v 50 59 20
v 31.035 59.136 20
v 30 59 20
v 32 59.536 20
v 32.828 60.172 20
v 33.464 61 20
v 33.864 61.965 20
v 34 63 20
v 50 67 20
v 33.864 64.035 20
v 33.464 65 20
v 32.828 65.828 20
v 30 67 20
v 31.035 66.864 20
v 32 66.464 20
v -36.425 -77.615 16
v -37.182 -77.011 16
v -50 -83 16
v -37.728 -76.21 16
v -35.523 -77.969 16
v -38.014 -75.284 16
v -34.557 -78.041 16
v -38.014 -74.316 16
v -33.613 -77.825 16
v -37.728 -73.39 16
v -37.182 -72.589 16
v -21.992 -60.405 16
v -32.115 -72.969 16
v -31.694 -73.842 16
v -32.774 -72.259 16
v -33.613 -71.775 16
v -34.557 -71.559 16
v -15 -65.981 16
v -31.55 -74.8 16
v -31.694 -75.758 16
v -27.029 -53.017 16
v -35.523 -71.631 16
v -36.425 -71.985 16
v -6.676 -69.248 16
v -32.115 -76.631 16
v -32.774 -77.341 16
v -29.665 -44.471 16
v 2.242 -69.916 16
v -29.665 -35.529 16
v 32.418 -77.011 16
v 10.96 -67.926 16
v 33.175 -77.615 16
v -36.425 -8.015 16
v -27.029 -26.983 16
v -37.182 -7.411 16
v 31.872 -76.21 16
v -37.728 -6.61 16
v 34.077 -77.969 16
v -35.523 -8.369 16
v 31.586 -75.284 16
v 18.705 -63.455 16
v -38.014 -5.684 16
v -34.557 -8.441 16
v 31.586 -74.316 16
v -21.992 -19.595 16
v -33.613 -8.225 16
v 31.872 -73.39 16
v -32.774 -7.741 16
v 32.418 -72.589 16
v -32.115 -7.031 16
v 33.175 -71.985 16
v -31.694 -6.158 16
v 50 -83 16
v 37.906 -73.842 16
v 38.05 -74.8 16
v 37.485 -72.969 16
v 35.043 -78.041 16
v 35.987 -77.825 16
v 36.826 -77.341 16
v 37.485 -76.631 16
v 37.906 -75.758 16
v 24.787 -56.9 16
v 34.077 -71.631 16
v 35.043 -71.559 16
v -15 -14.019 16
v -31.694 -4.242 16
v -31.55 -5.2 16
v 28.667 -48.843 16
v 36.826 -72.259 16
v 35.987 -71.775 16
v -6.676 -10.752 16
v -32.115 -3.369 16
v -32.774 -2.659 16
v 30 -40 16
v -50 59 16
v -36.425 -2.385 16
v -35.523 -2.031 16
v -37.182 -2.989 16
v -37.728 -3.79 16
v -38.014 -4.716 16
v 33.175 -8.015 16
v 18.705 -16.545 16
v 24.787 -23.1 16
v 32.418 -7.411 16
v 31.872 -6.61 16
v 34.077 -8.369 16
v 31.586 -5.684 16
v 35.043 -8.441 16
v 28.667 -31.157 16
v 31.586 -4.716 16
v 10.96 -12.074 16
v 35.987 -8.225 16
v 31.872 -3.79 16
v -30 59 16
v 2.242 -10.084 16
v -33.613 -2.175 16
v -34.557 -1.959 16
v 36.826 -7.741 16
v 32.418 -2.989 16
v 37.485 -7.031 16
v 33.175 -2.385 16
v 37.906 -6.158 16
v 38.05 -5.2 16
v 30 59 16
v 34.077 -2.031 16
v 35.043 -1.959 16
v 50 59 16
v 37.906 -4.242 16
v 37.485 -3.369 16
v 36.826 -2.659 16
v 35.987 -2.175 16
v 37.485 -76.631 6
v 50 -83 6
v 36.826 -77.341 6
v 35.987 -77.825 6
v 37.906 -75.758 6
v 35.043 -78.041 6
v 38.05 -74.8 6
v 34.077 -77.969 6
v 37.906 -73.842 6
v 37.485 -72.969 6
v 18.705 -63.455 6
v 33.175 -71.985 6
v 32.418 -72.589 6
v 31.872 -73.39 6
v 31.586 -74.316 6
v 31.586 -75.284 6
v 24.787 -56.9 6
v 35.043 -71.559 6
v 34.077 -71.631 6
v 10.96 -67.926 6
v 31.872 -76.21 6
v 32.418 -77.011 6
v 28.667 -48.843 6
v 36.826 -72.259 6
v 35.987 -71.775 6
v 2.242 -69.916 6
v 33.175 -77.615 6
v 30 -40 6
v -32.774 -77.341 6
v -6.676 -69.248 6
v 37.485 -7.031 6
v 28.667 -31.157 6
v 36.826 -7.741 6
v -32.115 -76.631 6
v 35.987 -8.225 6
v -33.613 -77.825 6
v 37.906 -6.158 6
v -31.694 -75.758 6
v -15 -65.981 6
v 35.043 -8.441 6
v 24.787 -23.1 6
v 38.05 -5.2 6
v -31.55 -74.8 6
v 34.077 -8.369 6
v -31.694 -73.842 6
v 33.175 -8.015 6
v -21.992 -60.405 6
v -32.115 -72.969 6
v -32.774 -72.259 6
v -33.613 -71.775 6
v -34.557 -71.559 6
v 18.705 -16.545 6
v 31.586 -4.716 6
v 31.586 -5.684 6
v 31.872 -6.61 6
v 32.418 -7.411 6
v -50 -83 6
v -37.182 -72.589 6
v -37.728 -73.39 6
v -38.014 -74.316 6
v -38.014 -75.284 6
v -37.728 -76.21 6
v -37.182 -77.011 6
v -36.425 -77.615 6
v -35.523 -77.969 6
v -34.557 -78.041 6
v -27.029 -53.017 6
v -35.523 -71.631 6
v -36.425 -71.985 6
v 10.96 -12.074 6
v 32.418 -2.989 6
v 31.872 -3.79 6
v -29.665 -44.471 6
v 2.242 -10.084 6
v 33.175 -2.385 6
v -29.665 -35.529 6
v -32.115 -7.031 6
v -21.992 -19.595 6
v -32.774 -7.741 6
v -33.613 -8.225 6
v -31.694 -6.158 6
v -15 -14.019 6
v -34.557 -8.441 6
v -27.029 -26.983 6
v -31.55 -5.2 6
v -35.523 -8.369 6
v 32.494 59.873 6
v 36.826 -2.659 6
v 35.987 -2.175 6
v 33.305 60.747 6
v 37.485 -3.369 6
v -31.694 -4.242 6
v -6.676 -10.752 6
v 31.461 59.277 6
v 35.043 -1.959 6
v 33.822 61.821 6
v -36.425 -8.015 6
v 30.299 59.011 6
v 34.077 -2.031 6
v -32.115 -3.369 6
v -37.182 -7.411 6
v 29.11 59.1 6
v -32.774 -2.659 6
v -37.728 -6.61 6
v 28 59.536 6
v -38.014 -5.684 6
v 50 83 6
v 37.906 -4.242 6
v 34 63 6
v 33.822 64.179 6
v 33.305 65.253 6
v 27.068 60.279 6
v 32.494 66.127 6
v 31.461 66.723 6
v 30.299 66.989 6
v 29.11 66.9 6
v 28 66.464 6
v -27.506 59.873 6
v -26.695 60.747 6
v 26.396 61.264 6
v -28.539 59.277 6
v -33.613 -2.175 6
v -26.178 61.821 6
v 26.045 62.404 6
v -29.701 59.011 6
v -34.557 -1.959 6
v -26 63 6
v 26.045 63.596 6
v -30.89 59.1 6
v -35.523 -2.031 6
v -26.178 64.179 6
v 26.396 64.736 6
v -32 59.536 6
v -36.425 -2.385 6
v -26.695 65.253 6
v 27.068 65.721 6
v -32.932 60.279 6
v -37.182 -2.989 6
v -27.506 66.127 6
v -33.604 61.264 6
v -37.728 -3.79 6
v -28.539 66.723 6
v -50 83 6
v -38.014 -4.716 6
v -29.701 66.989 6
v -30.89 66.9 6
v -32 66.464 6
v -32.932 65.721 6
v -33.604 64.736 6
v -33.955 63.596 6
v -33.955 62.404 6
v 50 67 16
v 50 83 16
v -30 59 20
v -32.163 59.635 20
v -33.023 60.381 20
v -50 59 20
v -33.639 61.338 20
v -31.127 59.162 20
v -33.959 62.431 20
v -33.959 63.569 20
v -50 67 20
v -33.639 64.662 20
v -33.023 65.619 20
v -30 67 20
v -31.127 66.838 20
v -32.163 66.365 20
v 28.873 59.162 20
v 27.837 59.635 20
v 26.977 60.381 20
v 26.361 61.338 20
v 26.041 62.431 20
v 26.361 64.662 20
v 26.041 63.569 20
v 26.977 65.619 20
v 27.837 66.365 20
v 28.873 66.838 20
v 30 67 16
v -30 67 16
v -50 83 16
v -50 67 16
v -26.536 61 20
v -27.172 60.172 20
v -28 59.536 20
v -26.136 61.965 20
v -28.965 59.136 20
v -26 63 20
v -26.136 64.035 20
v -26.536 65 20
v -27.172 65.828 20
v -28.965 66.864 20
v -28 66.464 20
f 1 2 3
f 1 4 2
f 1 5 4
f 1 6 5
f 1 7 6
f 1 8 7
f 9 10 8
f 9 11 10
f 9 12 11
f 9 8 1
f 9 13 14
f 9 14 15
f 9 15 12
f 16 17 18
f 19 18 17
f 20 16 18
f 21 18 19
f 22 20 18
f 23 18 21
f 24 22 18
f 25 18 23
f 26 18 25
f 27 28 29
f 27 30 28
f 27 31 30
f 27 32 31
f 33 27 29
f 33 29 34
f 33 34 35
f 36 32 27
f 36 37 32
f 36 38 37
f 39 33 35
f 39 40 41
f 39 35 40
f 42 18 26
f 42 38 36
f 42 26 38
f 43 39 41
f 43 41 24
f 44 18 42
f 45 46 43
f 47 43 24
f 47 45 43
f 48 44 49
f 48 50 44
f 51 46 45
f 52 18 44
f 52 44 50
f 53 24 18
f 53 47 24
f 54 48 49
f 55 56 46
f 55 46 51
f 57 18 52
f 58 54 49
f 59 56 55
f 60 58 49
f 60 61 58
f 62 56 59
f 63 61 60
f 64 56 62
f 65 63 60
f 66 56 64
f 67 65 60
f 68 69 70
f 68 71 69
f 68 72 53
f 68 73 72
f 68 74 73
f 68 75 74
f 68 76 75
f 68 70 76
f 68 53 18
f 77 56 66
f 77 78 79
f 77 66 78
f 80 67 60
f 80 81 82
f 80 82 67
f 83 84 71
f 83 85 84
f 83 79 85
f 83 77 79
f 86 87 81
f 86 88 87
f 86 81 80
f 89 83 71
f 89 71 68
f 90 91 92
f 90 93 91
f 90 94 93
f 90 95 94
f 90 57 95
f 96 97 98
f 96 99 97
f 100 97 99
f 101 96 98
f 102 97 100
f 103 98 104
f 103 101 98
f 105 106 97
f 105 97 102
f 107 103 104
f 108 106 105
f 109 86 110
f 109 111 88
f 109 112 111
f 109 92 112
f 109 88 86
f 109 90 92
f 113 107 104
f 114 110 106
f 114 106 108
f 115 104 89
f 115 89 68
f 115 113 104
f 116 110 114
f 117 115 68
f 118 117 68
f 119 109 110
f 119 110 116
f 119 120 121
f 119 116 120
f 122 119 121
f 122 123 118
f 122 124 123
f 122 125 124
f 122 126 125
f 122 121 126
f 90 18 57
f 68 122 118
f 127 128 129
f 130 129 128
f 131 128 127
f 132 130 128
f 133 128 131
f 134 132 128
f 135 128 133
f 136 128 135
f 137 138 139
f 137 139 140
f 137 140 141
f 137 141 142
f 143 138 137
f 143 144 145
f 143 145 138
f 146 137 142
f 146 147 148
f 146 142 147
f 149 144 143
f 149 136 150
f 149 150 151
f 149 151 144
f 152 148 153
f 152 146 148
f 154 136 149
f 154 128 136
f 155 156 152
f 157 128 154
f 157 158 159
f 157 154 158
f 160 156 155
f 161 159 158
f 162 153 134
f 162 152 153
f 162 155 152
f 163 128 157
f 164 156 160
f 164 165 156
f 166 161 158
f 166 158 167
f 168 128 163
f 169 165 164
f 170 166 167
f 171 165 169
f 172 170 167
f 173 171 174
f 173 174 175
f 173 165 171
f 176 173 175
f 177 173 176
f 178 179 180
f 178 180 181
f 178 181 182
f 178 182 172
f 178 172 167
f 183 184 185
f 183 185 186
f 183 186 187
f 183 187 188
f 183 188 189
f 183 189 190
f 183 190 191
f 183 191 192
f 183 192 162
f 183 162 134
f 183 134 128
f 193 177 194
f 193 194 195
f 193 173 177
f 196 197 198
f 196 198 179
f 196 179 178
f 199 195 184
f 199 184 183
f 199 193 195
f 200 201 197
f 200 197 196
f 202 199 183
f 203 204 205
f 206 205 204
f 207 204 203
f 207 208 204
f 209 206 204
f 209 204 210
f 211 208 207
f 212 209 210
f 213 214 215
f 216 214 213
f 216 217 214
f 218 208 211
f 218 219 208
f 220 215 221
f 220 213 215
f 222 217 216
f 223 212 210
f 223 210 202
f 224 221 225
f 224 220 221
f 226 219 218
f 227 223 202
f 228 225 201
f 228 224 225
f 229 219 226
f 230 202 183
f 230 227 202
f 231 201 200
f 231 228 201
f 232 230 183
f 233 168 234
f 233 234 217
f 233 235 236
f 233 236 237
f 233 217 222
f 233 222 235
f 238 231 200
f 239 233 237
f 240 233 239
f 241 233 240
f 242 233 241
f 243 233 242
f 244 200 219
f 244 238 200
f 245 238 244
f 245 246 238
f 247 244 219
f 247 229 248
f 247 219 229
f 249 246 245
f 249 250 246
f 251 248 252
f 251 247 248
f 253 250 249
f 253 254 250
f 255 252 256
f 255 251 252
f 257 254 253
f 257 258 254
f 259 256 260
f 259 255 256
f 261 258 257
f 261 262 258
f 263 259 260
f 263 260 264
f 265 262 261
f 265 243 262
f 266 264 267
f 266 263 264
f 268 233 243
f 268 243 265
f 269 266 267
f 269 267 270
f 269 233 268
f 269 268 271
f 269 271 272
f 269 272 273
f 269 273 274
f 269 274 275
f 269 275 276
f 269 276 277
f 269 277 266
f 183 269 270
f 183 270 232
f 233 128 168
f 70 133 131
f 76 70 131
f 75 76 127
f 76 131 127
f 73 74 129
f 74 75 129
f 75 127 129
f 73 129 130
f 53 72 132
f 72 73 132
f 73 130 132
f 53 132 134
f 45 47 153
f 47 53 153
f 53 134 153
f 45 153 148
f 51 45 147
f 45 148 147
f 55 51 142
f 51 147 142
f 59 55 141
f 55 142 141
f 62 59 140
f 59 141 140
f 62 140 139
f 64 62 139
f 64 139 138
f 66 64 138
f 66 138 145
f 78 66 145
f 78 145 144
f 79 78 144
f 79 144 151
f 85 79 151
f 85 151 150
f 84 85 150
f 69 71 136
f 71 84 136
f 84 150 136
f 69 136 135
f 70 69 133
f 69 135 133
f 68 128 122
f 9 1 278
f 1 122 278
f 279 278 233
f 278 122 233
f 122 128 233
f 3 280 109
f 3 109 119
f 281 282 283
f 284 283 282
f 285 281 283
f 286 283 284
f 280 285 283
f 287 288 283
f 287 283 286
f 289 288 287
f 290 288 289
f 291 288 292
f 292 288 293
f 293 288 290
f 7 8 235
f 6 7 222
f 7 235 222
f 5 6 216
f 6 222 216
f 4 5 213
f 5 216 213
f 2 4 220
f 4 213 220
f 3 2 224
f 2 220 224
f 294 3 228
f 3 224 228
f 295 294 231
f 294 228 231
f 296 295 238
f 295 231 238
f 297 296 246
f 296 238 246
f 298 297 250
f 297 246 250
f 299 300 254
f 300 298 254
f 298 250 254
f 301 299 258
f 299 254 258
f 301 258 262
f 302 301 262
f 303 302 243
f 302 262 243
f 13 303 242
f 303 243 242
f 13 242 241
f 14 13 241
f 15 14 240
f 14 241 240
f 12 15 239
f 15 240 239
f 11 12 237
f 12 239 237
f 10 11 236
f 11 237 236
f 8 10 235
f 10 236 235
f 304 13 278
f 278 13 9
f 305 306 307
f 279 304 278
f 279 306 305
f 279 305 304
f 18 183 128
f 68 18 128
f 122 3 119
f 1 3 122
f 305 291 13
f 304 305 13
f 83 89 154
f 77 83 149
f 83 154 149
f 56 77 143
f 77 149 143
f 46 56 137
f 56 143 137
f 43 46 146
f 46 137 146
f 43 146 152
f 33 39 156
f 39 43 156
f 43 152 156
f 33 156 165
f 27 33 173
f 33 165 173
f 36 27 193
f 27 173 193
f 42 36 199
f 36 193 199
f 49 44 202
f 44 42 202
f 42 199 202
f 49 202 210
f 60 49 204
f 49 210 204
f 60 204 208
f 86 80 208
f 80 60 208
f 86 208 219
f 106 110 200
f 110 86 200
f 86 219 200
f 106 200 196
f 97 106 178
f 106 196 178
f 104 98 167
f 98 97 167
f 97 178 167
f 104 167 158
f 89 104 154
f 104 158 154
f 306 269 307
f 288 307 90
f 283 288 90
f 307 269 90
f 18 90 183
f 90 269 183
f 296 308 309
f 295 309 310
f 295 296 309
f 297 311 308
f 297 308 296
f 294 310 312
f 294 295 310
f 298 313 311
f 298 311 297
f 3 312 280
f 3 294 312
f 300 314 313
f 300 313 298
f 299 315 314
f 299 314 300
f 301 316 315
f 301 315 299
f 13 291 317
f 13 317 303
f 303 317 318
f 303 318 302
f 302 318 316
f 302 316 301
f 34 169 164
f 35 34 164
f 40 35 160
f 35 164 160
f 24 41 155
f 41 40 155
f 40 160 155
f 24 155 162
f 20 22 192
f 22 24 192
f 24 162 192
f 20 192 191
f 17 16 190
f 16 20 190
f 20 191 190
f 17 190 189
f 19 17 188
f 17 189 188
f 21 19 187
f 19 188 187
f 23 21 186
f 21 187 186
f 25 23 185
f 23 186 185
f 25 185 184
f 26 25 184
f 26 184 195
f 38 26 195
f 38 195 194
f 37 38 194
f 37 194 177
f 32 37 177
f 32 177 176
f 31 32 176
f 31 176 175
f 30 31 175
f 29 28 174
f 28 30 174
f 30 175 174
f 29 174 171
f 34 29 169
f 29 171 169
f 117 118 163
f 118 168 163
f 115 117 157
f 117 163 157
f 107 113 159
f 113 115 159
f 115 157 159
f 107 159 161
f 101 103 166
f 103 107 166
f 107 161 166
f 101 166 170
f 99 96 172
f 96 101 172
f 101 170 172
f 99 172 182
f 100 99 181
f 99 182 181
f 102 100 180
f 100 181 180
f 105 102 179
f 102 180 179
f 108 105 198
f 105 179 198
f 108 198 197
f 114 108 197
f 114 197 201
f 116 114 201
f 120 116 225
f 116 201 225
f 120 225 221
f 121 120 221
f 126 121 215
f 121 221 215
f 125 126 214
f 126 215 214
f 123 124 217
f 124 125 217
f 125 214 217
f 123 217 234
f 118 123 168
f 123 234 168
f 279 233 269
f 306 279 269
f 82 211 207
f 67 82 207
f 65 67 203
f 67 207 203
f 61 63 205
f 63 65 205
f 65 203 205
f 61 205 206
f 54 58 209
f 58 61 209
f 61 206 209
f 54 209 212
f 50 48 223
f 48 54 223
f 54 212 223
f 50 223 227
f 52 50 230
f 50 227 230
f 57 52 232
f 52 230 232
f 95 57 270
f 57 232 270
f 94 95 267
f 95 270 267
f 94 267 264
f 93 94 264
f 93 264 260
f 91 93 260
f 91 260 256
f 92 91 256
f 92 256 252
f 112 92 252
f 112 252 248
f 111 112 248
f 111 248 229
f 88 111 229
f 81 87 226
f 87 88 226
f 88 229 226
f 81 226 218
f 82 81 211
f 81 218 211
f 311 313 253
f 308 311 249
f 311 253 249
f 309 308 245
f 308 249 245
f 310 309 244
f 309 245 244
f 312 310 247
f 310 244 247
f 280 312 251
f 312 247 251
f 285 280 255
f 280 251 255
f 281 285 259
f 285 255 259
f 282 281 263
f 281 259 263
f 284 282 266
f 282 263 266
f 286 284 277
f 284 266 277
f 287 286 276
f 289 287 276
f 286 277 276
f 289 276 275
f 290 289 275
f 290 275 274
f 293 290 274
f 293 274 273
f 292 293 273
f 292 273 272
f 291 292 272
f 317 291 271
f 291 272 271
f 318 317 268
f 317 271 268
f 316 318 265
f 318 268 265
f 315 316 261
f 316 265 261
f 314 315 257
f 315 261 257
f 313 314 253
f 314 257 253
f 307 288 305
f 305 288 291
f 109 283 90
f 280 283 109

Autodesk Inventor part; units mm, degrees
ref_plane "YZ Plane" through (0, 0, 0) normal (1, 0, 0) x (0, 1, 0)
ref_plane "XZ Plane" through (0, 0, 0) normal (0, 1, 0) x (-1, 0, 0)
ref_plane "XY Plane" through (0, 0, 0) normal (0, 0, 1) x (1, 0, 0)
sketch "Sketch1" plane through (0, 0, 0) normal (0, 0, 1) x (1, 0, 0)
  line L0 (0, 116.2) -> (0, -116.2) projected
  line L1 (-70, 0) -> (70, 0) projected
  line L2 (-50, -83) -> (50, -83)
  line L3 (50, -83) -> (50, 83)
  line L4 (50, 83) -> (-50, 83)
  line L5 (-50, 83) -> (-50, -83)
  circle A0 centre (0, -40) radius 30
  circle A1 centre (-30, 63) radius 4
  circle A2 centre (30, 63) radius 4
  circle A3 centre (34.8, -74.8) radius 3.25
  circle A4 centre (34.8, -5.2) radius 3.25
  circle A5 centre (-34.8, -5.2) radius 3.25
  circle A6 centre (-34.8, -74.8) radius 3.25
  line L6 (-30, 63) -> (-30, 59)
  line L7 (0, -40) -> (0, -10)
  point P0 (0, 0)
  dimension "d2" = 60
  dimension "d4" = 8
  dimension "d0" = 100
  dimension "d1" = 166
  dimension "d3" = 43
  dimension "d5" = 8
  dimension "d6" = 20
  dimension "d7" = 20
  dimension "d8" = 20
  dimension "d9" = 20
  dimension "d10" = 6.5
  dimension "d11" = 6.5
  dimension "d12" = 6.5
  dimension "d13" = 6.5
  dimension "d14" = 69.6
  dimension "d15" = 69.6
  dimension "d16" = 69.6
  dimension "d17" = 69.6
  dimension "d18" = 0
  dimension "d19" = 0
  dimension "d20" = 34.8
  dimension "d21" = 34.8
  dimension "d22" = 69
extrude "Extrusion1" add sketch "Sketch1" along normal blind 20 contours A0 L0 L2 L5 L1 | L0 L1 L3 L2 A0 | L1 L5 L4 L0 | L0 L4 L3 L1
sketch "Sketch2" plane through (0, 0, 20) normal (0, 0, 1) x (1, 0, 0)
  line L0 (50, 83) -> (-50, 83) projected
  line L1 (-50, 83) -> (-50, -83) projected
  line L2 (-50, -83) -> (50, -83) projected
  line L3 (50, -83) -> (50, 83) projected
  circle A0 centre (30, 63) radius 4 projected
  circle A1 centre (34.8, -5.2) radius 3.25 projected
  circle A2 centre (34.8, -74.8) radius 3.25 projected
  circle A3 centre (-34.8, -74.8) radius 3.25 projected
  circle A4 centre (-34.8, -5.2) radius 3.25 projected
  circle A5 centre (-30, 63) radius 4 projected
  circle A6 centre (0, -40) radius 30 projected
  line L4 (-50, 83) -> (-50, -83) projected
  line L5 (-50, 63) -> (50, 63)
  line L6 (-50, 67) -> (50, 67)
  line L7 (-50, 59) -> (50, 59)
  point P0 (0, 0)
  point P1 (50, 59)
  point P2 (-50, 59)
  point P3 (-50, 67)
  point P4 (50, 67)
  dimension "d25" = 4
  dimension "d26" = 4
extrude "Extrusion2" cut sketch "Sketch2" against normal blind 4 contours L3 L6 L1 L0 | L3 L2 L1 L7
sketch "Sketch3" plane through (0, 0, 0) normal (0, 0, -1) x (-1, 0, 0)
  line L0 (-50, 83) -> (50, 83) projected
  line L1 (-50, -83) -> (-50, 83) projected
  line L2 (50, -83) -> (-50, -83) projected
  line L3 (50, 83) -> (50, -83) projected
  circle A0 centre (-30, 63) radius 4 projected
  circle A1 centre (-34.8, -5.2) radius 3.25 projected
  circle A2 centre (-34.8, -74.8) radius 3.25 projected
  circle A3 centre (34.8, -74.8) radius 3.25 projected
  circle A4 centre (34.8, -5.2) radius 3.25 projected
  circle A5 centre (30, 63) radius 4 projected
  circle A6 centre (0, -40) radius 30 projected
  point P0 (0, 0)
extrude "Extrusion3" cut sketch "Sketch3" against normal blind 6
properties part number "motor mount middle"
